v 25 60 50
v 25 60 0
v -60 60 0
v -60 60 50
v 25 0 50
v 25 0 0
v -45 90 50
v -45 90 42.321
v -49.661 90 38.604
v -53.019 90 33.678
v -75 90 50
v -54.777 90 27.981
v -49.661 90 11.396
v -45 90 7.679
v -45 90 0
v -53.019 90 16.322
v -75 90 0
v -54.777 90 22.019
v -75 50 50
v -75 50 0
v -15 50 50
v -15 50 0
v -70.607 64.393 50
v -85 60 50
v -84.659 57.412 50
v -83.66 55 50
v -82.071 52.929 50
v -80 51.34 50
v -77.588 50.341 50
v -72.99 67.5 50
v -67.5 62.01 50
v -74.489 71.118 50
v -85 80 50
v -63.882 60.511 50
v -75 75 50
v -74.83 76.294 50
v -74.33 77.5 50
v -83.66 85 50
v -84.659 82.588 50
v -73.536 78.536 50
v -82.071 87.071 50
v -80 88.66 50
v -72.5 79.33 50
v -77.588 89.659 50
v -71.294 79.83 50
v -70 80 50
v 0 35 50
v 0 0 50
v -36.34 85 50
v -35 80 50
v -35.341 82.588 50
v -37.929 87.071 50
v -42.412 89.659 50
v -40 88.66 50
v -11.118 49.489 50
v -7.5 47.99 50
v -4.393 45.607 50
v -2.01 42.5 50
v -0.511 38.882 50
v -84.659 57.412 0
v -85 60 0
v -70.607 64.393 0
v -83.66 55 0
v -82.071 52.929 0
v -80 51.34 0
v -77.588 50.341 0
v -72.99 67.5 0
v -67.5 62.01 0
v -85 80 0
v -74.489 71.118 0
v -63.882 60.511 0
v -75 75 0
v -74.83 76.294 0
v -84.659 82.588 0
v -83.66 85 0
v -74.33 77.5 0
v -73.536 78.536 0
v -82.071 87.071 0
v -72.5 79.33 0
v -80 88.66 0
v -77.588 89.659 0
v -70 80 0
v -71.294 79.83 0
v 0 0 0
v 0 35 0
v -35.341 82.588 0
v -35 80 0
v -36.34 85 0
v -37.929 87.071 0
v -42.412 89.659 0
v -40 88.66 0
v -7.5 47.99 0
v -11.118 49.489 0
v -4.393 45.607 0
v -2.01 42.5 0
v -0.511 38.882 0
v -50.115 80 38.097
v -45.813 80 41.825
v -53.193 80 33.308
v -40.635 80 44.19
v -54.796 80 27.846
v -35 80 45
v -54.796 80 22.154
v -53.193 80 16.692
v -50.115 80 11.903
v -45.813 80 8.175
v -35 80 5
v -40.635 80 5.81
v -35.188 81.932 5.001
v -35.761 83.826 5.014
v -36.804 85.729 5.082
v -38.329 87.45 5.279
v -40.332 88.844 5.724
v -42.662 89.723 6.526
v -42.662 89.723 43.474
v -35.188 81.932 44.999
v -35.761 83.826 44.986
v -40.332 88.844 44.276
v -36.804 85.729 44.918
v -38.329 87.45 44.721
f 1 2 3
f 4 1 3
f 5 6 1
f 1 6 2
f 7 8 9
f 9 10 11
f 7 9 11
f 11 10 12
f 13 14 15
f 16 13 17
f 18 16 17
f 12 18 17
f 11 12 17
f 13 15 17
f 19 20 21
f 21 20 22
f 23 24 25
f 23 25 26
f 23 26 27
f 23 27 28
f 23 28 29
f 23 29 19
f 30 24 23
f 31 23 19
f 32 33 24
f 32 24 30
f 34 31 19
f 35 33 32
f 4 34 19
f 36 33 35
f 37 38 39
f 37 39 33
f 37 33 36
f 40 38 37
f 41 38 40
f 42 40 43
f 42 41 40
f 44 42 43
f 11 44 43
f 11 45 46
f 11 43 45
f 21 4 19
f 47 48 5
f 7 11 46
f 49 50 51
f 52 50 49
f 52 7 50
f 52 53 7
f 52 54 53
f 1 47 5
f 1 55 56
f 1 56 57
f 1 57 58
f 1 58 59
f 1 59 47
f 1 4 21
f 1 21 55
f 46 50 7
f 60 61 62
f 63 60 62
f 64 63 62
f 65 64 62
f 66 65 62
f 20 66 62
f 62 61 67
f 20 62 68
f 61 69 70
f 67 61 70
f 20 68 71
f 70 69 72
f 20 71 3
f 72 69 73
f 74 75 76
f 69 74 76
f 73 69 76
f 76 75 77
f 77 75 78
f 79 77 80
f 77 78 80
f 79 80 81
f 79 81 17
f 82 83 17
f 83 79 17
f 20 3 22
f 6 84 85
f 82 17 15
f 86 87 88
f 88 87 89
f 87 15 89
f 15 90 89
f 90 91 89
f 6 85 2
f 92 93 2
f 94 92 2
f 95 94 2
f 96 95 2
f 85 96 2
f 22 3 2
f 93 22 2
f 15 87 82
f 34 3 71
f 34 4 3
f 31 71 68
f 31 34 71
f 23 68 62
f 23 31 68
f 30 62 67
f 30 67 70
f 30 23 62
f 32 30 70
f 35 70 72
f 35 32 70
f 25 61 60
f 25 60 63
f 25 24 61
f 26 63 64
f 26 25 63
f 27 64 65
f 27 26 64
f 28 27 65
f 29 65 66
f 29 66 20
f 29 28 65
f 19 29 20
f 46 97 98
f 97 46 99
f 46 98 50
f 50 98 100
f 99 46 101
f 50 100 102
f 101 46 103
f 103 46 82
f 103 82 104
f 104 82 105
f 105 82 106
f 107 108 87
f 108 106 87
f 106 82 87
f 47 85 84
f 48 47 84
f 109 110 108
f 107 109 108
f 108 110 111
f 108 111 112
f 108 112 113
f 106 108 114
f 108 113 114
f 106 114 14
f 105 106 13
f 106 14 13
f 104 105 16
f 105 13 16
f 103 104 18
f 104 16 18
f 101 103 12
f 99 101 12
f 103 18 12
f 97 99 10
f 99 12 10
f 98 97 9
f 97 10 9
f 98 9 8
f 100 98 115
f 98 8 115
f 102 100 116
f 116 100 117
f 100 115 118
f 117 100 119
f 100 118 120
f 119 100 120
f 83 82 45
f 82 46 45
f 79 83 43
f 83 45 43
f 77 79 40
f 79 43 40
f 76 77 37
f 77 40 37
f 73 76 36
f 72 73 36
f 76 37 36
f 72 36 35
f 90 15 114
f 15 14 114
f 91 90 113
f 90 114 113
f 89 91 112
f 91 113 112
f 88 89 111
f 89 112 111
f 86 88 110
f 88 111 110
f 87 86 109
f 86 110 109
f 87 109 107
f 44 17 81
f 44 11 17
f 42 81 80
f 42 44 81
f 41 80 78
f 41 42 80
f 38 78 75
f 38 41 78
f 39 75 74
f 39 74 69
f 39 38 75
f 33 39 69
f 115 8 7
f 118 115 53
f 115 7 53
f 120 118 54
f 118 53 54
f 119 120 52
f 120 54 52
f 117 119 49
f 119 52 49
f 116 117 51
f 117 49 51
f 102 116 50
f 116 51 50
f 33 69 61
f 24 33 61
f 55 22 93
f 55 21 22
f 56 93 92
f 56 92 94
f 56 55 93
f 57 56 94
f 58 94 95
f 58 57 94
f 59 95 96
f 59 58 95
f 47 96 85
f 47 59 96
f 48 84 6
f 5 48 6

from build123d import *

# Parameters (mm, degrees)
BOSS_EXTRU_1_DEPTH      = 50
ESQUISSE3_R             = 20
ENL_V_MAT_EXTRU_1_DEPTH = 10
CONG_1_R                = 15
CONG_2_R                = 5
CONG_4_R                = 10
CONG_5_R                = 10


with BuildPart() as part:
    # Esquisse2 → Boss.-Extru.1 (new body)
    with BuildSketch(Plane.XY):
        Polygon((-35, 90), (-85, 90), (-85, 50), (0, 50), (0, 0), (25, 0), (25, 60), (-75, 60), (-75, 80), (-35, 80), align=None)
    extrude(amount=BOSS_EXTRU_1_DEPTH)

    # Esquisse3 → Enlèv. mat.-Extru.1 (cut)
    with BuildSketch(Plane(origin=(0, 90, 0), x_dir=(1, 0, 0), z_dir=(0, 1, 0))):
        with Locations((-35, -25)):
            Circle(ESQUISSE3_R)
    extrude(amount=-ENL_V_MAT_EXTRU_1_DEPTH, mode=Mode.SUBTRACT)

    # Congé1
    cong_1_edges = [part.edges().sort_by_distance(p)[0] for p in [
        (0, 50, 25),
        (-75, 60, 25),
    ]]
    fillet(cong_1_edges, radius=CONG_1_R)

    # Congé2
    cong_2_edges = [part.edges().sort_by_distance(p)[0] for p in [
        (-75, 80, 25),
    ]]
    fillet(cong_2_edges, radius=CONG_2_R - 0.0001)  # a hair under: the kernel refuses the full size

    # Congé4
    cong_4_edges = [part.edges().sort_by_distance(p)[0] for p in [
        (-85, 50, 25),
        (-85, 90, 25),
    ]]
    fillet(cong_4_edges, radius=CONG_4_R)

    # Congé5
    cong_5_edges = [part.edges().sort_by_distance(p)[0] for p in [
        (-35, 90, 2.5),
        (-35, 90, 47.5),
    ]]
    fillet(cong_5_edges, radius=CONG_5_R - 0.0001)  # a hair under: the kernel refuses the full size


solid = part.part
